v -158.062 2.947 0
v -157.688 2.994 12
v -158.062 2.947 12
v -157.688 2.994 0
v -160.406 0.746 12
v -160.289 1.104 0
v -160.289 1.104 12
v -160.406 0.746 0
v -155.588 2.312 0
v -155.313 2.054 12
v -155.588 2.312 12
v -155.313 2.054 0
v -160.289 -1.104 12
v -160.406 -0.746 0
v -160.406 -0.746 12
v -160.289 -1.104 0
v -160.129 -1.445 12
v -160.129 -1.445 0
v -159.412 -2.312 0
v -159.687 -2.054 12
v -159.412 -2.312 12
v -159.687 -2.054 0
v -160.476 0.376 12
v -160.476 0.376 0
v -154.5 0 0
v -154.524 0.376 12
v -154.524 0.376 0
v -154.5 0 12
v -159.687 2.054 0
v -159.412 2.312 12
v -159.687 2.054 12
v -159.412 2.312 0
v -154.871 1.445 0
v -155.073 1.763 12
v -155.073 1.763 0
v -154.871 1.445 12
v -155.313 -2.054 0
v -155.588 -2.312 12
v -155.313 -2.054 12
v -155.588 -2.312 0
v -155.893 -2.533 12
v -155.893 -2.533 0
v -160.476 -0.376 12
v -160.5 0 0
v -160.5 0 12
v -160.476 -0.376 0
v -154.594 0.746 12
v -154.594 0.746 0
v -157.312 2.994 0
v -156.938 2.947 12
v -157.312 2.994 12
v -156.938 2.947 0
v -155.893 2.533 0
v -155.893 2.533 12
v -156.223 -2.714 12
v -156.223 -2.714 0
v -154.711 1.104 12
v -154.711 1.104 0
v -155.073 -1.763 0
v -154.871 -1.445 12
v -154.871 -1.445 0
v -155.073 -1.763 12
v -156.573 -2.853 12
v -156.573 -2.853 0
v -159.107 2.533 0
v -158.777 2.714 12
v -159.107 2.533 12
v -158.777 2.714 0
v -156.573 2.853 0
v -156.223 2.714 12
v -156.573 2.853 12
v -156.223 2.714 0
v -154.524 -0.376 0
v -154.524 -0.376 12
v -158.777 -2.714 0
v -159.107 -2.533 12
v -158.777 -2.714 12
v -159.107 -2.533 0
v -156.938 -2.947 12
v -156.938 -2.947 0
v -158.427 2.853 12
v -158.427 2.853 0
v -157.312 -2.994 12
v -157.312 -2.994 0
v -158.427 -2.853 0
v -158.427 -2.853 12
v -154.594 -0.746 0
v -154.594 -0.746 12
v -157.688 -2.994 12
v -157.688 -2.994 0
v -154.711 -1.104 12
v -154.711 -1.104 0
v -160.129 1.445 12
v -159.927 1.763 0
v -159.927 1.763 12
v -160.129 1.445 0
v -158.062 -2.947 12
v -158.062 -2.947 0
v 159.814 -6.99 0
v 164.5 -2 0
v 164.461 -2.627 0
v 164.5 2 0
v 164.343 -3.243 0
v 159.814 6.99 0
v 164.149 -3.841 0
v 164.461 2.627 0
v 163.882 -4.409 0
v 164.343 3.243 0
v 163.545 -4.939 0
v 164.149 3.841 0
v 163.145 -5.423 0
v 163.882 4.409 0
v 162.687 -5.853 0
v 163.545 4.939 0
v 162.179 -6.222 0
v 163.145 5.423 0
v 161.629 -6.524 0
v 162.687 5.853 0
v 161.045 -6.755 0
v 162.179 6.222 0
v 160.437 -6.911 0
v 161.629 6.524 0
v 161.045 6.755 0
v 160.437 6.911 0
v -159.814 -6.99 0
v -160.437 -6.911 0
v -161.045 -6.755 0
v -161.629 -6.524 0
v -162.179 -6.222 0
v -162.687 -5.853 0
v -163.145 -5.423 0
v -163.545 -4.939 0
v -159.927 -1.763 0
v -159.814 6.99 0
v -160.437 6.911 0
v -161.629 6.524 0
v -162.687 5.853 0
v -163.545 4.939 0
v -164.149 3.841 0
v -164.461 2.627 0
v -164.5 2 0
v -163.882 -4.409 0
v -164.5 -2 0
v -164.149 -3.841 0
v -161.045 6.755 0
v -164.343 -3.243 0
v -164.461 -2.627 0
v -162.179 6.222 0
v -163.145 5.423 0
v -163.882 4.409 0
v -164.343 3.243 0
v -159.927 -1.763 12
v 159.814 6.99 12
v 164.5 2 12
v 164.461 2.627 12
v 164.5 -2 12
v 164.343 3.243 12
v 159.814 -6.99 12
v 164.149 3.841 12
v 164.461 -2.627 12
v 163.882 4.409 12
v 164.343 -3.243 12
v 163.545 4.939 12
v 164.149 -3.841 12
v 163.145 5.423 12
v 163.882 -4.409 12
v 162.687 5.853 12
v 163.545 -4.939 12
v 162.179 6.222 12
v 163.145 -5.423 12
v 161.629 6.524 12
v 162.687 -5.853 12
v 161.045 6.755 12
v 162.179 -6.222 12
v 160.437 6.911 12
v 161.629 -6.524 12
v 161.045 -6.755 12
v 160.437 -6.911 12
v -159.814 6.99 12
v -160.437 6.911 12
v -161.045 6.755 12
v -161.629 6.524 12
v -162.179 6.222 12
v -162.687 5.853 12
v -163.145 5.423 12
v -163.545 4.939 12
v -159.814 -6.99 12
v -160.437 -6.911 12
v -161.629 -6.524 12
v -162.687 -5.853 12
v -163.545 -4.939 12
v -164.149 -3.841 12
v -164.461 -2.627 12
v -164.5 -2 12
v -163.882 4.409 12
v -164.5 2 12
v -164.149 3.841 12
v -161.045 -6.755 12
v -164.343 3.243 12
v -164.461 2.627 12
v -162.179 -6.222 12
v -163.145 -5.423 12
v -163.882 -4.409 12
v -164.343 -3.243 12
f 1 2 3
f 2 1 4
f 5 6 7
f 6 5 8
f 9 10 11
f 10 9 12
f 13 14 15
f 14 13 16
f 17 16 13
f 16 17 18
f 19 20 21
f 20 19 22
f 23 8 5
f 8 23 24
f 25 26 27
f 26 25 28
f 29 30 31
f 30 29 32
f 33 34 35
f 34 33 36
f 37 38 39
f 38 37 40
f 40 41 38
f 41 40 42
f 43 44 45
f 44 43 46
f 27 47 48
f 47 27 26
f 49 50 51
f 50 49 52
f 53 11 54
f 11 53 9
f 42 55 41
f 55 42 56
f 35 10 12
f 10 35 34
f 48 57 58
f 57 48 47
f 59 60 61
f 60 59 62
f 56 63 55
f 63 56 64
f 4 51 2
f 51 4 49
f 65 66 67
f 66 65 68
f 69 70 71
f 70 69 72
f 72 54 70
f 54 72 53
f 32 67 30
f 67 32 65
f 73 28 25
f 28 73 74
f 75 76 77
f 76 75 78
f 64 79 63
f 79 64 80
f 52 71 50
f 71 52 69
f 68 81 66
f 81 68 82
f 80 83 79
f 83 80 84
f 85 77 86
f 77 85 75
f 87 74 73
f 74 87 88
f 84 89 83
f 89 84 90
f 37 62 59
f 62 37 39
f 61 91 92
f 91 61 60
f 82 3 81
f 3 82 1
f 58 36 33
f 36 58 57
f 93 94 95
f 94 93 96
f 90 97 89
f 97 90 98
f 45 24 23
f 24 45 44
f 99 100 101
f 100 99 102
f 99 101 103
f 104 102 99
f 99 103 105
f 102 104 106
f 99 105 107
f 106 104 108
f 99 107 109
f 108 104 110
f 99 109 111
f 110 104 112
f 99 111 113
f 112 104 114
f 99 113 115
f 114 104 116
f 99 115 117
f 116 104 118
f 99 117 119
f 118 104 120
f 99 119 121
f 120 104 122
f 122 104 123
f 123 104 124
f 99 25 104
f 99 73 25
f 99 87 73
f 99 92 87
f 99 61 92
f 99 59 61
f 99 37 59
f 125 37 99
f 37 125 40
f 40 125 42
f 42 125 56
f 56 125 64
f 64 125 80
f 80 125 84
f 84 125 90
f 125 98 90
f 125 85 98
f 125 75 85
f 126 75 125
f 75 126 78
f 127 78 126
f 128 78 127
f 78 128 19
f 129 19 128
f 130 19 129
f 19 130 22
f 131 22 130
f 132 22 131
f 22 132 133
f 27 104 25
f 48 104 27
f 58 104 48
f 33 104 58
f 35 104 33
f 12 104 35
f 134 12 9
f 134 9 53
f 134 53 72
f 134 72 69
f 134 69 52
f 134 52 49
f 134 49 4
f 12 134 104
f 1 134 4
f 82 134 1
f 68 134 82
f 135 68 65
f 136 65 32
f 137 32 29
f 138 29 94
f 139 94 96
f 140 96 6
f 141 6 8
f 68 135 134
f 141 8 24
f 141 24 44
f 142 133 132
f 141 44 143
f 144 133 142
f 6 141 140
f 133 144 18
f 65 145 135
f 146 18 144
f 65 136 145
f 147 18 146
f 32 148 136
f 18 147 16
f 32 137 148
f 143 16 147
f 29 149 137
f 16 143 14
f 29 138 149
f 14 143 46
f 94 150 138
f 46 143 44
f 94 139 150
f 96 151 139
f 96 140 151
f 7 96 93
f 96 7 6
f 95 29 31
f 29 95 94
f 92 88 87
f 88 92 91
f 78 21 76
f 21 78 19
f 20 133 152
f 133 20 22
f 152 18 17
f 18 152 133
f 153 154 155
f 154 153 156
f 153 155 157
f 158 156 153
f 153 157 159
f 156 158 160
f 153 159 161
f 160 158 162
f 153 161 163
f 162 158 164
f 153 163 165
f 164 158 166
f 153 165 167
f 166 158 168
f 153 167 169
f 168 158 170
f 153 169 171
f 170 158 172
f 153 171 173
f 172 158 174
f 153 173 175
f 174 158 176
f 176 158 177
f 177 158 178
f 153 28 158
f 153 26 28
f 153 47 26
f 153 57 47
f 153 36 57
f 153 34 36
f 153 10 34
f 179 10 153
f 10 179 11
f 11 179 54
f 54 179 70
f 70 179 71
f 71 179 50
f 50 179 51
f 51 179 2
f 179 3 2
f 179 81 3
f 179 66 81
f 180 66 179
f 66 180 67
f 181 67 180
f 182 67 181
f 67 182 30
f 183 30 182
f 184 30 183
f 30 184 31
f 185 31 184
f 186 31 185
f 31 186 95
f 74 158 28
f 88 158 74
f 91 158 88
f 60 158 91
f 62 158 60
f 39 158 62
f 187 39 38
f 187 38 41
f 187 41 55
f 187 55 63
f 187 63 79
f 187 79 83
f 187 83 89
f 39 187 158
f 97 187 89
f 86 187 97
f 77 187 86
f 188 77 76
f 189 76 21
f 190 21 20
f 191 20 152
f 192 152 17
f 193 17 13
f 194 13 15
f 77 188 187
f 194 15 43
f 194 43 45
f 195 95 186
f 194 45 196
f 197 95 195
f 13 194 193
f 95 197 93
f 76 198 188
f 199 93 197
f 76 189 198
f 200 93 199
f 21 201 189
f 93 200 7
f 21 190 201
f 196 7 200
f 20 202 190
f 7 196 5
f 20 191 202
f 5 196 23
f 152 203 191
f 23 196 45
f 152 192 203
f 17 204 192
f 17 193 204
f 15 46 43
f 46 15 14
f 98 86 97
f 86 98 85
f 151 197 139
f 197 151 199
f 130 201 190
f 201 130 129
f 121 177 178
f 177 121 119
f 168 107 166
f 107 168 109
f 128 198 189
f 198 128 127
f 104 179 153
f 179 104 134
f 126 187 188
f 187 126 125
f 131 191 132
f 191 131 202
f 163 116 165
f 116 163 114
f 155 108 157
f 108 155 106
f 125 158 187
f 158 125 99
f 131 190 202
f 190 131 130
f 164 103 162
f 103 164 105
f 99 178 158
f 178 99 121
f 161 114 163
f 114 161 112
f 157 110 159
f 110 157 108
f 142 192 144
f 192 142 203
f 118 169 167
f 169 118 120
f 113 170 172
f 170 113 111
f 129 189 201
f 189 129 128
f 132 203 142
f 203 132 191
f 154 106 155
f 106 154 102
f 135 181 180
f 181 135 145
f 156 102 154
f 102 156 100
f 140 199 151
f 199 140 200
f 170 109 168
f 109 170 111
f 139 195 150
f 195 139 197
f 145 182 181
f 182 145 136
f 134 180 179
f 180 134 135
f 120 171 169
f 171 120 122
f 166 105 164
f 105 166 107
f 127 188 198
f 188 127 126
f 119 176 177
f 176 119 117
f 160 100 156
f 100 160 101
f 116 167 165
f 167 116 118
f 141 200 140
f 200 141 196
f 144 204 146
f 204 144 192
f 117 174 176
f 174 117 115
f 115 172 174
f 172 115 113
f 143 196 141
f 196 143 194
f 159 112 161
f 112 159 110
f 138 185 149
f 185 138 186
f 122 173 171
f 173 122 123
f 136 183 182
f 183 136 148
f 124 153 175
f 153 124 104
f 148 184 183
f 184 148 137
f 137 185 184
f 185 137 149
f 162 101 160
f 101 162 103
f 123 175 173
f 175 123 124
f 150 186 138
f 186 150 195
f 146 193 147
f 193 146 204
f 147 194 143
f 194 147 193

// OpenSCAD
$fn = 50;


difference() {
	union() {
		hull() {
			translate(v = [-159.5000000000, 2.0000000000, 0]) {
				cylinder(h = 12, r = 5);
			}
			translate(v = [159.5000000000, 2.0000000000, 0]) {
				cylinder(h = 12, r = 5);
			}
			translate(v = [-159.5000000000, -2.0000000000, 0]) {
				cylinder(h = 12, r = 5);
			}
			translate(v = [159.5000000000, -2.0000000000, 0]) {
				cylinder(h = 12, r = 5);
			}
		}
	}
	union() {
		translate(v = [-157.5000000000, 0.0000000000, 0]) {
			cylinder(h = 12, r = 3.0000000000);
		}
		translate(v = [-157.5000000000, 0.0000000000, 0]) {
			cylinder(h = 12, r = 1.5000000000);
		}
		translate(v = [-157.5000000000, 0.0000000000, 0]) {
			cylinder(h = 12, r = 1.5000000000);
		}
		translate(v = [-157.5000000000, 0.0000000000, 0]) {
			cylinder(h = 12, r = 1.5000000000);
		}
	}
}
